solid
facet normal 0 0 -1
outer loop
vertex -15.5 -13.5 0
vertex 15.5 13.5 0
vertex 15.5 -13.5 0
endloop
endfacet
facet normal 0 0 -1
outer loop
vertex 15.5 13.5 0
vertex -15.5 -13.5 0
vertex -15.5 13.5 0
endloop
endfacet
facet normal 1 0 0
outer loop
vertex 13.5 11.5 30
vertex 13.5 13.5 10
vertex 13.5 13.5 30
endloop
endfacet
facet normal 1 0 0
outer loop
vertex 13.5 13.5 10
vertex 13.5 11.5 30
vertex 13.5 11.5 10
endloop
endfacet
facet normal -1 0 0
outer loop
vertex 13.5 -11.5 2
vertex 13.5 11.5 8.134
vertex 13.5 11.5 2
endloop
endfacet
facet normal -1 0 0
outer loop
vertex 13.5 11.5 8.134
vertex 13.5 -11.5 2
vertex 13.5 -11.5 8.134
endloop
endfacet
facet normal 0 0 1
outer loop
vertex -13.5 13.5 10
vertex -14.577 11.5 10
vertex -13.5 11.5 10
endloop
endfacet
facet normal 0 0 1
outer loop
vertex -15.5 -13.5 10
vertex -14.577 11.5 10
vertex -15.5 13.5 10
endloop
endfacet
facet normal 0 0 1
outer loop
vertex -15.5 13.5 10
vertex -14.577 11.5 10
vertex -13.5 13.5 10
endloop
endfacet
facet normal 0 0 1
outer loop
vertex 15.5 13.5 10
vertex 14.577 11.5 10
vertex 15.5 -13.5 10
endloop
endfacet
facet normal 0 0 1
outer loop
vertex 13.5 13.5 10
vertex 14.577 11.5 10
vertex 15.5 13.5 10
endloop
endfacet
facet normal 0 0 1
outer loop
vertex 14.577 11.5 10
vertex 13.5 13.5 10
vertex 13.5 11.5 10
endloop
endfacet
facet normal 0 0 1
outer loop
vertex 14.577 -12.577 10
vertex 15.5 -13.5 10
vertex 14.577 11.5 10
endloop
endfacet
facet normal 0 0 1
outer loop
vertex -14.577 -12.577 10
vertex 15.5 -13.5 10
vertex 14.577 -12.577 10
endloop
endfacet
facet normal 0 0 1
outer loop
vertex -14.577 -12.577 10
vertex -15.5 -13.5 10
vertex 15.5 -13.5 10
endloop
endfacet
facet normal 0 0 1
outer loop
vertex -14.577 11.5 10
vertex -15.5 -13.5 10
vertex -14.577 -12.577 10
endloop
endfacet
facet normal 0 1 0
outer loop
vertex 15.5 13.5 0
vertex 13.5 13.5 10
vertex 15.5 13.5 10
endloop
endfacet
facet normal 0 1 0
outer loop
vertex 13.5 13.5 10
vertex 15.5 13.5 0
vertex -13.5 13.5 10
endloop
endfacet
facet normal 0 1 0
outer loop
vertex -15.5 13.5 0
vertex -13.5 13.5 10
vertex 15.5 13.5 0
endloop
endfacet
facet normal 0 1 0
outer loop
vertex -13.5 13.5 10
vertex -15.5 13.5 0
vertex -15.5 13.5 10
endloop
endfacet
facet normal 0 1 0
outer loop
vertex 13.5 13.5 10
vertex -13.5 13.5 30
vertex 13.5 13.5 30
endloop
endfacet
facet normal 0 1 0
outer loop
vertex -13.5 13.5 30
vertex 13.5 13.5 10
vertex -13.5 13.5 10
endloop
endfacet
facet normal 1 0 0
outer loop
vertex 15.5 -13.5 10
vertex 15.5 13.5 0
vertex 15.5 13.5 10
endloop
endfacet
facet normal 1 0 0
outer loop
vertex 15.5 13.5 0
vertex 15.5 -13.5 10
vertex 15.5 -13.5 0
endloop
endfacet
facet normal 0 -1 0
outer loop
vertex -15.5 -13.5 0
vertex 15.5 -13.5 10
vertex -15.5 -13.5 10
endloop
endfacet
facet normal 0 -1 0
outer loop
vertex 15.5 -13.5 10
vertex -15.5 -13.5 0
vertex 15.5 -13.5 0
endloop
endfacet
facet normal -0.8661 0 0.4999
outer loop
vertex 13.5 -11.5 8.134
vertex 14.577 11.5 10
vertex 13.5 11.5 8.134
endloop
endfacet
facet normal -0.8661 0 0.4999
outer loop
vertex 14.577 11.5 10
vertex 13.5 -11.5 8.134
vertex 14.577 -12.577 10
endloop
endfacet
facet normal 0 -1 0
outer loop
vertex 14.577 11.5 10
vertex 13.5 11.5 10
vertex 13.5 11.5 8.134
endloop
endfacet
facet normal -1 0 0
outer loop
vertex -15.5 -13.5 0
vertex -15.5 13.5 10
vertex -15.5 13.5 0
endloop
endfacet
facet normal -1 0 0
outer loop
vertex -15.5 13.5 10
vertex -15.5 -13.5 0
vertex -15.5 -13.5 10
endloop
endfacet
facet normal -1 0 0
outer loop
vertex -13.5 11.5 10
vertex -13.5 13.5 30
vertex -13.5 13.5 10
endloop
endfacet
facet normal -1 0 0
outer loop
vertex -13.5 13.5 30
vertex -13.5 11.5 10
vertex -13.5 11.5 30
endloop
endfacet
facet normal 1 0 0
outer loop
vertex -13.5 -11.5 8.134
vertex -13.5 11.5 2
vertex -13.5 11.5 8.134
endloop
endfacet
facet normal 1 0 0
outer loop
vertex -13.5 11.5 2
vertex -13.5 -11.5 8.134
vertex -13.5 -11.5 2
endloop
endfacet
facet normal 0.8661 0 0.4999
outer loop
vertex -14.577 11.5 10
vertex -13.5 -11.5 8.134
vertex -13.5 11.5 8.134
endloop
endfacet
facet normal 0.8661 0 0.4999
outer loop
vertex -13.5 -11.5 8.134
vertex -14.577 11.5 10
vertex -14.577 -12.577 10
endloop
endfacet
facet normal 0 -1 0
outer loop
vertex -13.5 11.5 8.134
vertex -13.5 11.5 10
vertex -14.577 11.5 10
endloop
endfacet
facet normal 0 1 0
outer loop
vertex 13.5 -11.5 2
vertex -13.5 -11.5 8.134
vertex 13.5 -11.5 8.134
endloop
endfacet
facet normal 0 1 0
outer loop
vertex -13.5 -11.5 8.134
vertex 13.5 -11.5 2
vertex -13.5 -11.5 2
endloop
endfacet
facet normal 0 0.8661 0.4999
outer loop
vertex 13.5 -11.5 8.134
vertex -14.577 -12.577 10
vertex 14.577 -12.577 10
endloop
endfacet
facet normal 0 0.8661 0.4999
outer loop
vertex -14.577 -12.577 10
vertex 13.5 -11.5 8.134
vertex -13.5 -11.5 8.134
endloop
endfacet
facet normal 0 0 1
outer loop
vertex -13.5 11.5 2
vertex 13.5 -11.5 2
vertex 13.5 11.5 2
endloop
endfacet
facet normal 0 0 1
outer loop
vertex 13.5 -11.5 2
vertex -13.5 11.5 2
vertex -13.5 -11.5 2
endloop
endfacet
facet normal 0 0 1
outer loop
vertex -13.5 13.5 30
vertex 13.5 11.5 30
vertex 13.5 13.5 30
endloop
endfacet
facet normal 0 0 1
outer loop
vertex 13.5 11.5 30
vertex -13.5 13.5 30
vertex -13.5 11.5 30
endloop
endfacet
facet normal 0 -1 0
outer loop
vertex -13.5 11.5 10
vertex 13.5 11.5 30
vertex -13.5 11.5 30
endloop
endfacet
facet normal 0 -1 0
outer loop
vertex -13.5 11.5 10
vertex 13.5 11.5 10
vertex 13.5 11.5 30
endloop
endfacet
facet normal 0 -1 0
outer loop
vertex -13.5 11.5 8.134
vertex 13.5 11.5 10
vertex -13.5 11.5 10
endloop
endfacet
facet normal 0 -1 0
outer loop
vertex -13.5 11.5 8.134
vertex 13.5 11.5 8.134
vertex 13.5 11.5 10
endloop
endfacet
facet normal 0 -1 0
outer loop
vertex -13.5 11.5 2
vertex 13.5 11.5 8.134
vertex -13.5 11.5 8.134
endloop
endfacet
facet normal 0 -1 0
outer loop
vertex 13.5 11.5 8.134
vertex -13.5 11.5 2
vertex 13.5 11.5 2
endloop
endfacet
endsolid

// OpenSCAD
// fase
module fase(length=1, rotation=60) {
    rotate(rotation, [0,1,0]) {
        cube([4,length,1], true);
    }
}

module box_holder() {
    // bottom
    linear_extrude(2) {
        square([27.5, 23.5], true);
    }

    // right  wall
    difference() {
        linear_extrude(10) {
            translate([14.5,0,0]) {
                    square([2, 27], true);
            }
        }
        translate([14, -1.5, 10]) {
            fase(26, -60);
        }
    }


    // left wall
    difference() {
        linear_extrude(10) {
            translate([-14.5,0,0]) {
                square([2, 27], true);
            }
        }
        translate([-14, -1.5, 10]) {
            fase(26, 60);
        }
    }

    // front wall
    difference() {
        linear_extrude(10){
            translate([0,-12.5,0]) {
                square([30, 2], true);
            }
        }
        translate([0, -12, 10]) {
            rotate(90, [0,0,1]) {
                fase(30);
            }
        }
    }

    // back wall
    linear_extrude(30) {
        translate([0,12.5,0]) {
            square([27, 2], true);
        }
    }
}

module card_holder() {
    translate([0.5,2,2]) {
    import("libs/stl/SD_Holder.stl");
    }
}

box_holder();
// card_holder();
